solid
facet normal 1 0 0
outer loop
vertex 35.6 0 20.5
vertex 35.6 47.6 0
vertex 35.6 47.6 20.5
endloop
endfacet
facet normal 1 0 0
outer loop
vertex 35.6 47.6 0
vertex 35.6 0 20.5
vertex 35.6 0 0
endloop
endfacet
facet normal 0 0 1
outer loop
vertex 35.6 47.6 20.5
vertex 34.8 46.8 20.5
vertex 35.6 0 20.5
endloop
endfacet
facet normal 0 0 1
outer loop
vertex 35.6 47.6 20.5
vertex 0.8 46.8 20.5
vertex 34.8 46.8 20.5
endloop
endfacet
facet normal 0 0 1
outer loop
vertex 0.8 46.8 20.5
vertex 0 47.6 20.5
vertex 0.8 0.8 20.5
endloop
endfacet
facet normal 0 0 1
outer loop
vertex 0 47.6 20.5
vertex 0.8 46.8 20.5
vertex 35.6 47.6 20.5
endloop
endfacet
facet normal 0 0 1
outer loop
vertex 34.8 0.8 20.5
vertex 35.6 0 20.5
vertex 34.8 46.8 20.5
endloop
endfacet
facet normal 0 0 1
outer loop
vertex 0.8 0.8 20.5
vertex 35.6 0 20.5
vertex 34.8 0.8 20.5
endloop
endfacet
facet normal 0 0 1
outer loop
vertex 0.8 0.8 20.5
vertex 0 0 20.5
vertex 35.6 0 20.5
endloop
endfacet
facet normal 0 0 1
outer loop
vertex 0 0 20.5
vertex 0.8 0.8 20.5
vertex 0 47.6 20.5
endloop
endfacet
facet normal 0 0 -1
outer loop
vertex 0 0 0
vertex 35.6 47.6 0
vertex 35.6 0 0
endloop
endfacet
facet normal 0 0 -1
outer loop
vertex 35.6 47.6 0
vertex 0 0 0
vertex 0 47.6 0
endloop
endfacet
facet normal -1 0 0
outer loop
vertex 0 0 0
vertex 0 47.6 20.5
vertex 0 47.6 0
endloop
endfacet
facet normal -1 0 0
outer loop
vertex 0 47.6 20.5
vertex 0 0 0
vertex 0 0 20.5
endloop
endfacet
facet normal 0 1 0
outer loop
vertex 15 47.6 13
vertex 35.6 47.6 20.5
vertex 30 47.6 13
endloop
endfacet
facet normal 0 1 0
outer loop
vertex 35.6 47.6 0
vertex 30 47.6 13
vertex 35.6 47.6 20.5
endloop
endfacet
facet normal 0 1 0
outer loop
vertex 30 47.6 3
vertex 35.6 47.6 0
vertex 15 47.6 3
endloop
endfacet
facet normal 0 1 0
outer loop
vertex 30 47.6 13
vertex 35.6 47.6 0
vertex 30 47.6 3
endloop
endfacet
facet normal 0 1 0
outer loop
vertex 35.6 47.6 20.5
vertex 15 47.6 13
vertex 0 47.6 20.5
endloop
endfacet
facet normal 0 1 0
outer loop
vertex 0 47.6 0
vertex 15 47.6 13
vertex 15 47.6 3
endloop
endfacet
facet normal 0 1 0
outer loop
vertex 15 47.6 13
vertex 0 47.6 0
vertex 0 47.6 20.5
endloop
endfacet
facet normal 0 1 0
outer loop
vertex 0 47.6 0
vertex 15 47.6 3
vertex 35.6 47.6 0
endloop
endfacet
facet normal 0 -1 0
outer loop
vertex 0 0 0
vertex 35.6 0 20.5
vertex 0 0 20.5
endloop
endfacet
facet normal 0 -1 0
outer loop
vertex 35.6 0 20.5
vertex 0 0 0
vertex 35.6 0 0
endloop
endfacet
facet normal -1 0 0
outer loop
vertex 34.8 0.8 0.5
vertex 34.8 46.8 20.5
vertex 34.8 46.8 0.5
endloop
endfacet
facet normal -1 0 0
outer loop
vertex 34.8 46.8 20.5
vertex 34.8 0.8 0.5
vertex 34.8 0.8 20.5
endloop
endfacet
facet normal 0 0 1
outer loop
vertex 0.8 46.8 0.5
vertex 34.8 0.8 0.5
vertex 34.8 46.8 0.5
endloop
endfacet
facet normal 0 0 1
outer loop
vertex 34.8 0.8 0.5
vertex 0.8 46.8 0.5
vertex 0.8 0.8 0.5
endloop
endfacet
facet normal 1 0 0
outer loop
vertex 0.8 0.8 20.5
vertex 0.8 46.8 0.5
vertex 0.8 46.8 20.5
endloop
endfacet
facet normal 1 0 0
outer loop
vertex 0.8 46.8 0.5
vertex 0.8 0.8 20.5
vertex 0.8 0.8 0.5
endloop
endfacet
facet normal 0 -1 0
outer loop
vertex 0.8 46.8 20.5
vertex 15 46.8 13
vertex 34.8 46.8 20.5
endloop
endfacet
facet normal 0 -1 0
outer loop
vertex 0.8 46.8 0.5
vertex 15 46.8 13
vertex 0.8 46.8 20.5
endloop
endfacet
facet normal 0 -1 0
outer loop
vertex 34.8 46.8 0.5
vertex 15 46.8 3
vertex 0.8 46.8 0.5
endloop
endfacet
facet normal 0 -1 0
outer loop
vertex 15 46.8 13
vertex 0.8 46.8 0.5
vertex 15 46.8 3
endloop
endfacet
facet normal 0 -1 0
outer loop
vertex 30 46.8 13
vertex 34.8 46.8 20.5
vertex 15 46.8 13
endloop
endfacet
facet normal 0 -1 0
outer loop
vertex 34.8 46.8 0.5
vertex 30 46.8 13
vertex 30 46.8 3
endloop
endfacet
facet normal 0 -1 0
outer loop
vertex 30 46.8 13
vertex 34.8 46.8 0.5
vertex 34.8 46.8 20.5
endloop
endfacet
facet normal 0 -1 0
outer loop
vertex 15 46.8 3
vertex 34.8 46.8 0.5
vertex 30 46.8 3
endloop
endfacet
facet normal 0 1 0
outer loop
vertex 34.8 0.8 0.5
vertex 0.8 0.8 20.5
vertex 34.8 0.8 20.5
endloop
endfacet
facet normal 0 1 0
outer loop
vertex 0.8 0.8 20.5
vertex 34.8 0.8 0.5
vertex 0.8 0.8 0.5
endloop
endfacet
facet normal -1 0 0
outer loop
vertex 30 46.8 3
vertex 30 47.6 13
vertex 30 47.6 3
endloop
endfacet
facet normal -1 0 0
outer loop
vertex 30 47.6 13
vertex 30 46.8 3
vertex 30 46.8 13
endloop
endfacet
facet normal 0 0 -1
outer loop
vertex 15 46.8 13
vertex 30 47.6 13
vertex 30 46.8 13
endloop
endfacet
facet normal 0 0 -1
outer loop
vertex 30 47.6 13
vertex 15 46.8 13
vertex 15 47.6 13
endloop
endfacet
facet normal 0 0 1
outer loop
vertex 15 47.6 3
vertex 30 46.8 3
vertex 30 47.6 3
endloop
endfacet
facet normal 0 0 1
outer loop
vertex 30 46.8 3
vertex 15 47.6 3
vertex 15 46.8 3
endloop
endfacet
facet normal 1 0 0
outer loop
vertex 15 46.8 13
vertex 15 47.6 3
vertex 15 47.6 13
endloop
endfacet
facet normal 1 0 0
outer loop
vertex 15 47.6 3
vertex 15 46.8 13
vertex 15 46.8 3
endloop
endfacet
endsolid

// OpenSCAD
/**
 *    goobay_psu_case
 * 
 *    @author         Karel Fiala
 *    @email         fiala.karel@gmail.com
 */

$fn=100;

module goobay_psu_case() {

    x = 34;
    y = 46;
    z = 20;
    
    wall_thick = 0.8;
    bottom_thick = 0.5;

    difference() {
        cube([x + 2*wall_thick, y + 2*wall_thick, z + bottom_thick]);
        translate([wall_thick, wall_thick, bottom_thick])
            cube([x, y, z + 10]);
        
        // USB
        translate([15, y, 3])
            color("red") cube([15, 3*wall_thick, 10]);
    }

}


// calling
goobay_psu_case();
